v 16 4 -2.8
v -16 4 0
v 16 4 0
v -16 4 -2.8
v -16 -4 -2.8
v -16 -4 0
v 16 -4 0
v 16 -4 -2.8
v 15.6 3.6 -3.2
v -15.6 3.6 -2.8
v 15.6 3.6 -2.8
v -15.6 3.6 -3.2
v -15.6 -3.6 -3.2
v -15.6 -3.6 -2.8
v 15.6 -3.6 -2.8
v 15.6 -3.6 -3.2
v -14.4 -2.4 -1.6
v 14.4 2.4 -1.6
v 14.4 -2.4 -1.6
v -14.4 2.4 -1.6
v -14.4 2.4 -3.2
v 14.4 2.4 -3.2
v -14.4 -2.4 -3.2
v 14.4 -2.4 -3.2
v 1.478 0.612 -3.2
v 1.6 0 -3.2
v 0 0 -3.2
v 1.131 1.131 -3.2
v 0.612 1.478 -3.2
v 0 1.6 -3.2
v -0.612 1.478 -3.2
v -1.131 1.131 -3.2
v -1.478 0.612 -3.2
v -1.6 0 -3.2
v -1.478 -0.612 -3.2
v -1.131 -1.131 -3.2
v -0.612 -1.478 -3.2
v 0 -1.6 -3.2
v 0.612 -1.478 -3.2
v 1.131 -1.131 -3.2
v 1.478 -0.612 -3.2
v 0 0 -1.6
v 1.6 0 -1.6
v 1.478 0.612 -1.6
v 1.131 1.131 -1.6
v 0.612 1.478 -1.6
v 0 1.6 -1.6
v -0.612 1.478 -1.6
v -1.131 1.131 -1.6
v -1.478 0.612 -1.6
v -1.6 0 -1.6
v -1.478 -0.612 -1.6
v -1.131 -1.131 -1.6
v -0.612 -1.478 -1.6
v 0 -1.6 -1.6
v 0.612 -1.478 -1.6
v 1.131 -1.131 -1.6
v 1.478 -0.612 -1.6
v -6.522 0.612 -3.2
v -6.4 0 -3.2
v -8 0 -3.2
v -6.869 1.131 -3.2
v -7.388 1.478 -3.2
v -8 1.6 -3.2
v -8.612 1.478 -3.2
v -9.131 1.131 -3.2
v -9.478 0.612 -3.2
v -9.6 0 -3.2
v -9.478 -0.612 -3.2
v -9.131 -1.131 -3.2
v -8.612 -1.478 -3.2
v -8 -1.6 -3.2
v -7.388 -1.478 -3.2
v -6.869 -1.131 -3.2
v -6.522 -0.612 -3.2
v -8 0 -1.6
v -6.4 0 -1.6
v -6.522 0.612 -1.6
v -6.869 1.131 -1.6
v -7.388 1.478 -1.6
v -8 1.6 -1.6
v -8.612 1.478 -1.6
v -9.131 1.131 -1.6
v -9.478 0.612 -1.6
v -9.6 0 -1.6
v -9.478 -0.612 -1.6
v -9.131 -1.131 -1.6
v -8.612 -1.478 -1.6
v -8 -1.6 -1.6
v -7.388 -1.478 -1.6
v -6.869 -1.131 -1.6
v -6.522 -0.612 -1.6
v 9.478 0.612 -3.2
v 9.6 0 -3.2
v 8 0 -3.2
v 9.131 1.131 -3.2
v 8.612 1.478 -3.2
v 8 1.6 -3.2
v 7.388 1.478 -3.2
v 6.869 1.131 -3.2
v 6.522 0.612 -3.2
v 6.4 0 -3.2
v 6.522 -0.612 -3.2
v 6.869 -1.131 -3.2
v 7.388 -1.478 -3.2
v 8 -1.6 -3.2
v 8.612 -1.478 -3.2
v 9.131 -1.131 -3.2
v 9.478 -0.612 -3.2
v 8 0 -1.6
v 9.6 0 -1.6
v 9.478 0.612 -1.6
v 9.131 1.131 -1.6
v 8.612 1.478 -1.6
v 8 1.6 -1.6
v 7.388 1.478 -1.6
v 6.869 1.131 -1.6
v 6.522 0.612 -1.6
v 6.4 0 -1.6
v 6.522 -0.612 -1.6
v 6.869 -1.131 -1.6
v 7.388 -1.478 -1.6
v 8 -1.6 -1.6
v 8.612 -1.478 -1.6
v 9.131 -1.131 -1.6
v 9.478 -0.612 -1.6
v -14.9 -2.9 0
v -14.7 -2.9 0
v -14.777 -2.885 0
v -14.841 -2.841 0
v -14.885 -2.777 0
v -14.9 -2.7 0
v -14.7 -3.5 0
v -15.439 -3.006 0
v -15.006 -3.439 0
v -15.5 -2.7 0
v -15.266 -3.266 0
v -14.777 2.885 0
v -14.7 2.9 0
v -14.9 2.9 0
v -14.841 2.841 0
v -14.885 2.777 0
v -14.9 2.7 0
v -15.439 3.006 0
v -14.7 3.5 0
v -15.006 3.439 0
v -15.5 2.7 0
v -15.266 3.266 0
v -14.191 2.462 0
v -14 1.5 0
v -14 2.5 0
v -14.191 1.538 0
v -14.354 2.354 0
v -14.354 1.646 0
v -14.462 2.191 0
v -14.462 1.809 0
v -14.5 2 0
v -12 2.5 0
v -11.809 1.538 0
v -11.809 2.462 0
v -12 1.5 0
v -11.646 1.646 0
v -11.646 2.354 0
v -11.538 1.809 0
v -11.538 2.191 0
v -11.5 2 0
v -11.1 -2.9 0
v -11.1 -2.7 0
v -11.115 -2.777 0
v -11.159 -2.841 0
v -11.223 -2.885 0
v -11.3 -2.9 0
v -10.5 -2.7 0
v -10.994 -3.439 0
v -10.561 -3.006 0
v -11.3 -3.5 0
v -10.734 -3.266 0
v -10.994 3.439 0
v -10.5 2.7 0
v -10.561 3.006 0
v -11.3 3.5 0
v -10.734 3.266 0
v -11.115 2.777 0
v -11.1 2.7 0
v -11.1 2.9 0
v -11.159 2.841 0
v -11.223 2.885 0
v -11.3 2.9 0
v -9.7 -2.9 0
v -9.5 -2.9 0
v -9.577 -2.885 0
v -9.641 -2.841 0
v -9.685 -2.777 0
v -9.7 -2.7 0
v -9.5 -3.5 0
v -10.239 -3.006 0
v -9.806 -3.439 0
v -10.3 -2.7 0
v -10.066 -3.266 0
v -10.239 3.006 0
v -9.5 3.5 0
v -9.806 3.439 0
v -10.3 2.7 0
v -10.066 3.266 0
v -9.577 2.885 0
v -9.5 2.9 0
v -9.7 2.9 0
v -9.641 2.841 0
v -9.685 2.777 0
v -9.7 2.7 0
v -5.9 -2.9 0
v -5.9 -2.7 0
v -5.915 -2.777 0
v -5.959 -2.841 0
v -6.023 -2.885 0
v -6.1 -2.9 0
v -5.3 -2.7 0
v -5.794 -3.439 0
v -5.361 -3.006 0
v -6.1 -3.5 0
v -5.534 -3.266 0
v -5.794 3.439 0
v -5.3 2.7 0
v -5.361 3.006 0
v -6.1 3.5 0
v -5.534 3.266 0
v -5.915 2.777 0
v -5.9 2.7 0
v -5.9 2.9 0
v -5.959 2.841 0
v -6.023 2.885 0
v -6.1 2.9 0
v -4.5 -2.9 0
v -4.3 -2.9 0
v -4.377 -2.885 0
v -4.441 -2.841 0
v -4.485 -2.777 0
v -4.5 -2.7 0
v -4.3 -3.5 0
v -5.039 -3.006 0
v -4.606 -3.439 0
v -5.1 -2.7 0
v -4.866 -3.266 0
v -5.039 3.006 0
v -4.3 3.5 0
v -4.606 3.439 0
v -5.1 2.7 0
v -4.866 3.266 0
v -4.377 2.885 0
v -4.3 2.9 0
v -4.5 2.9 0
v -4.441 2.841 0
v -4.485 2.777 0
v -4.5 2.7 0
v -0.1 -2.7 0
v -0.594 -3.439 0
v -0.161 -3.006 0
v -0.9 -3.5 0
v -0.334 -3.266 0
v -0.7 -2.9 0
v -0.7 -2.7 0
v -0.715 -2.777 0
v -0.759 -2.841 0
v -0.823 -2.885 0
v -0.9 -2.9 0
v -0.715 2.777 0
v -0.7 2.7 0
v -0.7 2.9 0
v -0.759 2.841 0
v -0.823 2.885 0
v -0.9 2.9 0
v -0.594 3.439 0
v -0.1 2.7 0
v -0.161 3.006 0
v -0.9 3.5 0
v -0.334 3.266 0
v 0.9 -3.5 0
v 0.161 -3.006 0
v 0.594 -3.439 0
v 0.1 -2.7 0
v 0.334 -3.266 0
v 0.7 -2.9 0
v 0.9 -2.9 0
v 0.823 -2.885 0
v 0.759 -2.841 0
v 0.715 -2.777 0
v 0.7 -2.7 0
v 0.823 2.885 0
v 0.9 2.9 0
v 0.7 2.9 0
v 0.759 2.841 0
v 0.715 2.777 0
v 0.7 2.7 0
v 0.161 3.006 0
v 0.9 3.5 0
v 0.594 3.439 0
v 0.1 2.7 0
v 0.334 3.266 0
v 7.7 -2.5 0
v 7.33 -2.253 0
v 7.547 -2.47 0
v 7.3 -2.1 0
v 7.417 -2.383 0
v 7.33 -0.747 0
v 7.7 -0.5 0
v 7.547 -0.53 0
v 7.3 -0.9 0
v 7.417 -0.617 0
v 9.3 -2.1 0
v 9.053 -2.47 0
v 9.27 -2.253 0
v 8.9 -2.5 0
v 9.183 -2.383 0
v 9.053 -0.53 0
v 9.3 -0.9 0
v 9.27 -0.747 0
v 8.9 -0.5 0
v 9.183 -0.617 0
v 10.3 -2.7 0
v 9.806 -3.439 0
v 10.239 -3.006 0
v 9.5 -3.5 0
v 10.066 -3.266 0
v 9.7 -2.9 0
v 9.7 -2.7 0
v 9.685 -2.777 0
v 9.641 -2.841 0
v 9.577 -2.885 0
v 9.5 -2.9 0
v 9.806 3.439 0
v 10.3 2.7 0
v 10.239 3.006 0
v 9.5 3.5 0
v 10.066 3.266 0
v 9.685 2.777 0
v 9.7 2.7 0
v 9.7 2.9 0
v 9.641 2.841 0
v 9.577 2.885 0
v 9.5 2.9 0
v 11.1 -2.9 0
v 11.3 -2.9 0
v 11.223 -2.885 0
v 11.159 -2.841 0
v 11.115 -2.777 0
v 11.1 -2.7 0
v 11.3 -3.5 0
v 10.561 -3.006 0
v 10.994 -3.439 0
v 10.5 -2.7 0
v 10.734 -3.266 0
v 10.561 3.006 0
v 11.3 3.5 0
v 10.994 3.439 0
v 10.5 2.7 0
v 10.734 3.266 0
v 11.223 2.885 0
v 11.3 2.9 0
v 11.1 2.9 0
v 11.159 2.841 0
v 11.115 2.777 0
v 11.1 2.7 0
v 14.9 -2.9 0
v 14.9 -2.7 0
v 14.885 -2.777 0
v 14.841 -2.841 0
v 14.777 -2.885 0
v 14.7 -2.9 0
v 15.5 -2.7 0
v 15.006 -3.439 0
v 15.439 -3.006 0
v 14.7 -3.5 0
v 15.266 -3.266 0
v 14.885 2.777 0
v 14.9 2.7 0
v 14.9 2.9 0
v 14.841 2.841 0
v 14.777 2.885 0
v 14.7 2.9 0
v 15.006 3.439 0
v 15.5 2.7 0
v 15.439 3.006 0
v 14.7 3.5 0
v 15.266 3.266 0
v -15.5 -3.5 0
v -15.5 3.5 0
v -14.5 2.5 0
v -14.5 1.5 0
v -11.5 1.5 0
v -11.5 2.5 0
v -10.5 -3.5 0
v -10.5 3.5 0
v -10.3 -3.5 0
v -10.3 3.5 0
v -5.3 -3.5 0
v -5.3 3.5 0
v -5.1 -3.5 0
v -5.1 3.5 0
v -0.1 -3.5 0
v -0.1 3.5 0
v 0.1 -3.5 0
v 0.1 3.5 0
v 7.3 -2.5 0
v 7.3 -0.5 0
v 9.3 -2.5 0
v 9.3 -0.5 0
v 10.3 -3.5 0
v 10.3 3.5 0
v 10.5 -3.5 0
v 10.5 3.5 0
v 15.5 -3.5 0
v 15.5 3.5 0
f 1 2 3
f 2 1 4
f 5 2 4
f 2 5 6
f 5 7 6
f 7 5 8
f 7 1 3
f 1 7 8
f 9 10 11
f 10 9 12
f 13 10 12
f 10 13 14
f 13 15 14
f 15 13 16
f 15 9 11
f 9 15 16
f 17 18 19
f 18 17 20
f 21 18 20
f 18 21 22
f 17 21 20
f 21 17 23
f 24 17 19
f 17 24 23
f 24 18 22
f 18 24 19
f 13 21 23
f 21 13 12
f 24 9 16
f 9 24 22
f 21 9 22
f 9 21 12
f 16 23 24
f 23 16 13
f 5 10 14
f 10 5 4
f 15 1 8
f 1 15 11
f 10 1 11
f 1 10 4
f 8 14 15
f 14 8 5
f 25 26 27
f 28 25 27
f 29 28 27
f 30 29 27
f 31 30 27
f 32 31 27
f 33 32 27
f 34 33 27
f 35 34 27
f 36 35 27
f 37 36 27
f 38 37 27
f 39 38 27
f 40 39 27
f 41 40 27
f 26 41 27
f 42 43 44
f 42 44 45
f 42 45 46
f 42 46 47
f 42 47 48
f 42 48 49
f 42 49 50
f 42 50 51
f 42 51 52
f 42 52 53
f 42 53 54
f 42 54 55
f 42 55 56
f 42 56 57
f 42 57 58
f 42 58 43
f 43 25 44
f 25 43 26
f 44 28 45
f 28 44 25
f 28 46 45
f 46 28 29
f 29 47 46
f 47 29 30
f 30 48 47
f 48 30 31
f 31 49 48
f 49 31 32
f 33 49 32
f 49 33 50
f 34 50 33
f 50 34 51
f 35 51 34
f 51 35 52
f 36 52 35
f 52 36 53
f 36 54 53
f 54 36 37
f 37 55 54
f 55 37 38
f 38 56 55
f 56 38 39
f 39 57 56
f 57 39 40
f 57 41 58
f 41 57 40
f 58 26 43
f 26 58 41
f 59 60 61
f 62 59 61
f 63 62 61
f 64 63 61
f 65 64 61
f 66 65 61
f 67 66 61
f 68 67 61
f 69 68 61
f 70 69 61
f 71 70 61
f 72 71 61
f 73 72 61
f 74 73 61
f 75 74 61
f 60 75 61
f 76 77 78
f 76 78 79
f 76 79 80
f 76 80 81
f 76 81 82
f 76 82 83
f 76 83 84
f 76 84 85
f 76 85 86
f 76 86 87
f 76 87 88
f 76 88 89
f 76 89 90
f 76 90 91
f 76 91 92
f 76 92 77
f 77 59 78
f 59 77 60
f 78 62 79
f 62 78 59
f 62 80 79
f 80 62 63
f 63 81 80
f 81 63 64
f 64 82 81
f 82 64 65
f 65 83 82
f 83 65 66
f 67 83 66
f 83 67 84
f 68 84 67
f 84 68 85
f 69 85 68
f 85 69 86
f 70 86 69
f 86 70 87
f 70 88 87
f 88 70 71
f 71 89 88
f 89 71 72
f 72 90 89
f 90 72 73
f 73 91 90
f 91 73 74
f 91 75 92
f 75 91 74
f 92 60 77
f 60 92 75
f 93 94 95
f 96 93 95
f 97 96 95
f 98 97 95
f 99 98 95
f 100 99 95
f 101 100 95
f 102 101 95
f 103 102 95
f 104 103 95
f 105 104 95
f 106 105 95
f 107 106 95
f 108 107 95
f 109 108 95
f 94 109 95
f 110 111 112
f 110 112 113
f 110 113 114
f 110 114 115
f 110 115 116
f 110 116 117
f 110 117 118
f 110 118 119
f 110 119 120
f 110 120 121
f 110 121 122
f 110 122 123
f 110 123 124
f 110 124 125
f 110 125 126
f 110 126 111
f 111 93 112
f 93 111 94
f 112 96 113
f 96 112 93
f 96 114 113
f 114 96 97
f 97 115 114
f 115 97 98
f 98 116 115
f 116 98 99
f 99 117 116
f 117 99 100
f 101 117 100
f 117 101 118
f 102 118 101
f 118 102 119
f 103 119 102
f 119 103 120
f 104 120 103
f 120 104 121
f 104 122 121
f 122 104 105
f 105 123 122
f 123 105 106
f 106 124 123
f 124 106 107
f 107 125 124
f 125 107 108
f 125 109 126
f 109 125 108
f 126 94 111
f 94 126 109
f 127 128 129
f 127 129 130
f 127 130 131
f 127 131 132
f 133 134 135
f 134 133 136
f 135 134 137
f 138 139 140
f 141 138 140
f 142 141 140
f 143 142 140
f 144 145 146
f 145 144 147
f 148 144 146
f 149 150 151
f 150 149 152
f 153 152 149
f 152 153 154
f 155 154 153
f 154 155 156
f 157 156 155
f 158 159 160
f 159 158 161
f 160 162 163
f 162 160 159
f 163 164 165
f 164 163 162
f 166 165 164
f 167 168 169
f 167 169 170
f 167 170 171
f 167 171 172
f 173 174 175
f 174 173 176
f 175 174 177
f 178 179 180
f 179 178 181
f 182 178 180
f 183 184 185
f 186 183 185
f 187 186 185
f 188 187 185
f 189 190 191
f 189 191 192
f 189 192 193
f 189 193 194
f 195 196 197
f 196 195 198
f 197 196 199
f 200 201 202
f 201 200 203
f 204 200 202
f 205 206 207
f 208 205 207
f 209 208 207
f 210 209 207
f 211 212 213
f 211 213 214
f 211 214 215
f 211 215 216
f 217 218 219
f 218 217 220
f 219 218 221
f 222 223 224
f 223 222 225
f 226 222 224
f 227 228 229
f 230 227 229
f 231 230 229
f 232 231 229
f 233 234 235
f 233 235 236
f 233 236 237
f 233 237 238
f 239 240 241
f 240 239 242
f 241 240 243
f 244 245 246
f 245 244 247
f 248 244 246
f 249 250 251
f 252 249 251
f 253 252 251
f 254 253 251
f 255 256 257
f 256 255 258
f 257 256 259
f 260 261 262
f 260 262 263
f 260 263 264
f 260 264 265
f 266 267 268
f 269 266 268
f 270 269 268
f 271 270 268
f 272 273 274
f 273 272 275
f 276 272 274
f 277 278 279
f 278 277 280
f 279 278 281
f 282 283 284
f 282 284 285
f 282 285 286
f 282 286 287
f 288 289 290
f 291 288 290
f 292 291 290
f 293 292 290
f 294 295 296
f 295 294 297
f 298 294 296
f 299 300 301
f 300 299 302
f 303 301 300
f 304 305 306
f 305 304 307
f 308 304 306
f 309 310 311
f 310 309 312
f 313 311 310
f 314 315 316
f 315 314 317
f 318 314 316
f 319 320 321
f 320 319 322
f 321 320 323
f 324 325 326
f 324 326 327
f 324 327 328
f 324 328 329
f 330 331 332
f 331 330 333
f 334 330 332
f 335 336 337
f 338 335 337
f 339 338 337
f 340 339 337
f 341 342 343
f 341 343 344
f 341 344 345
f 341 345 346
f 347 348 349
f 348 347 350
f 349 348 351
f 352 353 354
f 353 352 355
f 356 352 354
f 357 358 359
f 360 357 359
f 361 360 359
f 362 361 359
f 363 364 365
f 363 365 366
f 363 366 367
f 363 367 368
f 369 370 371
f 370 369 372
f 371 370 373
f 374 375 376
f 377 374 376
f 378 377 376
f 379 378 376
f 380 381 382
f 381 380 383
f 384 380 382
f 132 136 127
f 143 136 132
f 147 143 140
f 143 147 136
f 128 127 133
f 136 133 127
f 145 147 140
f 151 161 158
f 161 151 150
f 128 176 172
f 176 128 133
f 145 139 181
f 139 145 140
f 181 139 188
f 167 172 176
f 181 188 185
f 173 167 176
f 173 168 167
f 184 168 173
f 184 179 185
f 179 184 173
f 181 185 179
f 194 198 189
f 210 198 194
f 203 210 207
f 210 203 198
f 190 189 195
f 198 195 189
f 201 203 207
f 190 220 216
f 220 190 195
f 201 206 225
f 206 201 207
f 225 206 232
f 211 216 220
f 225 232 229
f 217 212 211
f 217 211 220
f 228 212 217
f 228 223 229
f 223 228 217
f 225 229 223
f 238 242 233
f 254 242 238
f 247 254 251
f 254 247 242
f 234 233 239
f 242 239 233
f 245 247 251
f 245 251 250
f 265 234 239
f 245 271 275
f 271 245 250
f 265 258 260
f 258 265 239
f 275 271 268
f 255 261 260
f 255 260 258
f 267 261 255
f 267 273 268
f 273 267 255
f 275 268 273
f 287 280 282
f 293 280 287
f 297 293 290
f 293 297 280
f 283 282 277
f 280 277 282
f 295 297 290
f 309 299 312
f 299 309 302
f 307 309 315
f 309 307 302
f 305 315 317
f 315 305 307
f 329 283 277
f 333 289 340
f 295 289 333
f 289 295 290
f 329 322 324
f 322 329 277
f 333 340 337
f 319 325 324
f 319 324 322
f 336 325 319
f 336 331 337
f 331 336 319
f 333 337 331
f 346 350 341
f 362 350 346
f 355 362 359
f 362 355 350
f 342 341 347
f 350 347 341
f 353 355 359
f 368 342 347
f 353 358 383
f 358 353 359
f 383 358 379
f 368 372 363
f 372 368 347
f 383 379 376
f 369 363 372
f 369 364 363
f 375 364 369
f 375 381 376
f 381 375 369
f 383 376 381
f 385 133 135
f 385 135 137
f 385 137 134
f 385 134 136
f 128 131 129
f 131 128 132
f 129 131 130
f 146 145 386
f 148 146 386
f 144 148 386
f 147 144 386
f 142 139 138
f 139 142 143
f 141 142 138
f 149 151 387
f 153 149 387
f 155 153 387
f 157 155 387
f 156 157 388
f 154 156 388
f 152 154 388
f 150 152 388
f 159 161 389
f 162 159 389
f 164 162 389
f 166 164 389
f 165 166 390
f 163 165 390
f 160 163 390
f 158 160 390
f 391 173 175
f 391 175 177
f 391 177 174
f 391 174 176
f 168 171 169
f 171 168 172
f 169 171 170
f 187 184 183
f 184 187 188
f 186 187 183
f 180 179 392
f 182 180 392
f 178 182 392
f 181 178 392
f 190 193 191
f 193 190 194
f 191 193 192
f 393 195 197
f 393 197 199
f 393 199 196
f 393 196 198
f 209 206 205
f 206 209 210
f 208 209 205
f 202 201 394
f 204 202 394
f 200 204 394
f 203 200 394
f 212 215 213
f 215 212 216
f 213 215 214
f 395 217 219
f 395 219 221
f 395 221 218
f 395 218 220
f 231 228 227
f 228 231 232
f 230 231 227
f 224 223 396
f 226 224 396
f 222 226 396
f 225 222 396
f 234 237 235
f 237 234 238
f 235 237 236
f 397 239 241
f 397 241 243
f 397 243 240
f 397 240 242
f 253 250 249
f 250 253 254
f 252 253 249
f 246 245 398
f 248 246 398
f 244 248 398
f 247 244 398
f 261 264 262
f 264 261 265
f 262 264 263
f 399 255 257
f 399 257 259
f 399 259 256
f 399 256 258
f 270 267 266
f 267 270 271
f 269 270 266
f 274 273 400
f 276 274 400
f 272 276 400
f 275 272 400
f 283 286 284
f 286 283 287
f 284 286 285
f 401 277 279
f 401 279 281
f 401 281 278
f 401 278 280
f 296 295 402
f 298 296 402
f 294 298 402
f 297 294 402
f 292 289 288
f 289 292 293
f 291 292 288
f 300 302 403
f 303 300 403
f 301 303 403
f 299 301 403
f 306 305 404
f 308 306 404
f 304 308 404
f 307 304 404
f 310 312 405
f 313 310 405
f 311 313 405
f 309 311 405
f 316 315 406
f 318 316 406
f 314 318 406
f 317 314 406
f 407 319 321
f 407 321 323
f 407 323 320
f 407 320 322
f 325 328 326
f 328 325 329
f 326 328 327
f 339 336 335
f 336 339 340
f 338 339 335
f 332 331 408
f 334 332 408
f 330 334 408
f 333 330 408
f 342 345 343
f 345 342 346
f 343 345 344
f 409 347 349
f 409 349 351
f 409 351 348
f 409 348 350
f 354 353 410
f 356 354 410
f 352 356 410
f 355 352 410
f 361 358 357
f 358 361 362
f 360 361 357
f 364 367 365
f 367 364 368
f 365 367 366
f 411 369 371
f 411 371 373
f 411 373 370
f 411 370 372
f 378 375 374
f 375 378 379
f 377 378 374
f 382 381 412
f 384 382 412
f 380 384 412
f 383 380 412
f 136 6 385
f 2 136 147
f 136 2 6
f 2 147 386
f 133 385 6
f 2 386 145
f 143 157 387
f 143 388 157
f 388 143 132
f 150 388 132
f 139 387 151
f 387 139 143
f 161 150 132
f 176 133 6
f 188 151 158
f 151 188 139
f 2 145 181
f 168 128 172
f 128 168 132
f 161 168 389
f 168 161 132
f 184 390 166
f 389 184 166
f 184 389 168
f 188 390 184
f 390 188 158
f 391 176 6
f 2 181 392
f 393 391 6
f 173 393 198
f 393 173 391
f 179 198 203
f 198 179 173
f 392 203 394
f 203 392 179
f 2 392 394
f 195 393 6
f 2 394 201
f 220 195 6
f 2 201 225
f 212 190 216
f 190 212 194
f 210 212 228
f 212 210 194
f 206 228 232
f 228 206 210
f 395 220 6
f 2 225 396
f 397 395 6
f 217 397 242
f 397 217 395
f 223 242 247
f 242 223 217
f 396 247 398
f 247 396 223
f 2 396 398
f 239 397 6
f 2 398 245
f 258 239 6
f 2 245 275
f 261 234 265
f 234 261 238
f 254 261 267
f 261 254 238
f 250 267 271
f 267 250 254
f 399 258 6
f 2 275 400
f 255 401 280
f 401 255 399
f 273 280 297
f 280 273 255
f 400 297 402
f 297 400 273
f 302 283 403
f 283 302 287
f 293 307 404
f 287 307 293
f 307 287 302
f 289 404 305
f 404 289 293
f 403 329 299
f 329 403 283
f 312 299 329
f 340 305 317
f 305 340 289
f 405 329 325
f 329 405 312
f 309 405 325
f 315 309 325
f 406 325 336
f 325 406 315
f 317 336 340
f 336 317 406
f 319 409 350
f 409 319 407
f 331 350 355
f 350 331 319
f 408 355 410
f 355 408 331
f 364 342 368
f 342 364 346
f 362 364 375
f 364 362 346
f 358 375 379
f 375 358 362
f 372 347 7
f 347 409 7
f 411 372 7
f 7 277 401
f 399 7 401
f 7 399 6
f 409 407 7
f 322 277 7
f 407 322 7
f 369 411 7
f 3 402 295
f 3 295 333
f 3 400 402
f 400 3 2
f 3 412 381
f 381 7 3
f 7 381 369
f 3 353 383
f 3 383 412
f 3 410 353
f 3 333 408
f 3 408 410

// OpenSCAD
use <../lib.scad>
use <s/2431pzbs01.scad>
use <s/2431pzbs02.scad>
use <s/2431s01.scad>
function ldraw_lib__2431pzc() = [
// 0 Tile  1 x  4 with Metallic Silver Stormtrooper Utility Belt Pattern
// 0 Name: 2431pzc.dat
// 0 Author: Damien Roux [Darats]
// 0 !LDRAW_ORG Part UPDATE 2019-02
// 0 !LICENSE Licensed under CC BY 4.0 : see CAreadme.txt
// 
// 0 BFC CERTIFY CCW
  [0,"BFC","CERTIFY"],
  [0,"BFC","CCW"],
// 
// 0 !KEYWORDS Brickheadz, Bricklink 2431pb490, Captain Phasma
// 0 !KEYWORDS Rebrickable 2431pr0104, Set 41486
// 
// 0 !HISTORY 2019-09-09 [PTadmin] Official Update 2019-02
// 
// 
// 1 16 0 0 0 1 0 0 0 1 0 0 0 1 s\2431s01.dat
  [1,16,0,0,0,1,0,0,0,1,0,0,0,1, ldraw_lib__s__2431s01()],
// 1 80 0 0 0 1 0 0 0 1 0 0 0 1 s\2431pzbs01.dat
  [1,80,0,0,0,1,0,0,0,1,0,0,0,1, ldraw_lib__s__2431pzbs01()],
// 1 16 0 0 0 1 0 0 0 1 0 0 0 1 s\2431pzbs02.dat
  [1,16,0,0,0,1,0,0,0,1,0,0,0,1, ldraw_lib__s__2431pzbs02()],
];
module ldraw_lib__2431pzc(step=0, col=false, unit=2/5, alt=false, line=0.2, solid=!$preview)
    makepoly(ldraw_lib__2431pzc(), step=step, col=col, unit=unit, alt=alt, line=line, solid=solid);
ldraw_lib__2431pzc(line=0.2);
